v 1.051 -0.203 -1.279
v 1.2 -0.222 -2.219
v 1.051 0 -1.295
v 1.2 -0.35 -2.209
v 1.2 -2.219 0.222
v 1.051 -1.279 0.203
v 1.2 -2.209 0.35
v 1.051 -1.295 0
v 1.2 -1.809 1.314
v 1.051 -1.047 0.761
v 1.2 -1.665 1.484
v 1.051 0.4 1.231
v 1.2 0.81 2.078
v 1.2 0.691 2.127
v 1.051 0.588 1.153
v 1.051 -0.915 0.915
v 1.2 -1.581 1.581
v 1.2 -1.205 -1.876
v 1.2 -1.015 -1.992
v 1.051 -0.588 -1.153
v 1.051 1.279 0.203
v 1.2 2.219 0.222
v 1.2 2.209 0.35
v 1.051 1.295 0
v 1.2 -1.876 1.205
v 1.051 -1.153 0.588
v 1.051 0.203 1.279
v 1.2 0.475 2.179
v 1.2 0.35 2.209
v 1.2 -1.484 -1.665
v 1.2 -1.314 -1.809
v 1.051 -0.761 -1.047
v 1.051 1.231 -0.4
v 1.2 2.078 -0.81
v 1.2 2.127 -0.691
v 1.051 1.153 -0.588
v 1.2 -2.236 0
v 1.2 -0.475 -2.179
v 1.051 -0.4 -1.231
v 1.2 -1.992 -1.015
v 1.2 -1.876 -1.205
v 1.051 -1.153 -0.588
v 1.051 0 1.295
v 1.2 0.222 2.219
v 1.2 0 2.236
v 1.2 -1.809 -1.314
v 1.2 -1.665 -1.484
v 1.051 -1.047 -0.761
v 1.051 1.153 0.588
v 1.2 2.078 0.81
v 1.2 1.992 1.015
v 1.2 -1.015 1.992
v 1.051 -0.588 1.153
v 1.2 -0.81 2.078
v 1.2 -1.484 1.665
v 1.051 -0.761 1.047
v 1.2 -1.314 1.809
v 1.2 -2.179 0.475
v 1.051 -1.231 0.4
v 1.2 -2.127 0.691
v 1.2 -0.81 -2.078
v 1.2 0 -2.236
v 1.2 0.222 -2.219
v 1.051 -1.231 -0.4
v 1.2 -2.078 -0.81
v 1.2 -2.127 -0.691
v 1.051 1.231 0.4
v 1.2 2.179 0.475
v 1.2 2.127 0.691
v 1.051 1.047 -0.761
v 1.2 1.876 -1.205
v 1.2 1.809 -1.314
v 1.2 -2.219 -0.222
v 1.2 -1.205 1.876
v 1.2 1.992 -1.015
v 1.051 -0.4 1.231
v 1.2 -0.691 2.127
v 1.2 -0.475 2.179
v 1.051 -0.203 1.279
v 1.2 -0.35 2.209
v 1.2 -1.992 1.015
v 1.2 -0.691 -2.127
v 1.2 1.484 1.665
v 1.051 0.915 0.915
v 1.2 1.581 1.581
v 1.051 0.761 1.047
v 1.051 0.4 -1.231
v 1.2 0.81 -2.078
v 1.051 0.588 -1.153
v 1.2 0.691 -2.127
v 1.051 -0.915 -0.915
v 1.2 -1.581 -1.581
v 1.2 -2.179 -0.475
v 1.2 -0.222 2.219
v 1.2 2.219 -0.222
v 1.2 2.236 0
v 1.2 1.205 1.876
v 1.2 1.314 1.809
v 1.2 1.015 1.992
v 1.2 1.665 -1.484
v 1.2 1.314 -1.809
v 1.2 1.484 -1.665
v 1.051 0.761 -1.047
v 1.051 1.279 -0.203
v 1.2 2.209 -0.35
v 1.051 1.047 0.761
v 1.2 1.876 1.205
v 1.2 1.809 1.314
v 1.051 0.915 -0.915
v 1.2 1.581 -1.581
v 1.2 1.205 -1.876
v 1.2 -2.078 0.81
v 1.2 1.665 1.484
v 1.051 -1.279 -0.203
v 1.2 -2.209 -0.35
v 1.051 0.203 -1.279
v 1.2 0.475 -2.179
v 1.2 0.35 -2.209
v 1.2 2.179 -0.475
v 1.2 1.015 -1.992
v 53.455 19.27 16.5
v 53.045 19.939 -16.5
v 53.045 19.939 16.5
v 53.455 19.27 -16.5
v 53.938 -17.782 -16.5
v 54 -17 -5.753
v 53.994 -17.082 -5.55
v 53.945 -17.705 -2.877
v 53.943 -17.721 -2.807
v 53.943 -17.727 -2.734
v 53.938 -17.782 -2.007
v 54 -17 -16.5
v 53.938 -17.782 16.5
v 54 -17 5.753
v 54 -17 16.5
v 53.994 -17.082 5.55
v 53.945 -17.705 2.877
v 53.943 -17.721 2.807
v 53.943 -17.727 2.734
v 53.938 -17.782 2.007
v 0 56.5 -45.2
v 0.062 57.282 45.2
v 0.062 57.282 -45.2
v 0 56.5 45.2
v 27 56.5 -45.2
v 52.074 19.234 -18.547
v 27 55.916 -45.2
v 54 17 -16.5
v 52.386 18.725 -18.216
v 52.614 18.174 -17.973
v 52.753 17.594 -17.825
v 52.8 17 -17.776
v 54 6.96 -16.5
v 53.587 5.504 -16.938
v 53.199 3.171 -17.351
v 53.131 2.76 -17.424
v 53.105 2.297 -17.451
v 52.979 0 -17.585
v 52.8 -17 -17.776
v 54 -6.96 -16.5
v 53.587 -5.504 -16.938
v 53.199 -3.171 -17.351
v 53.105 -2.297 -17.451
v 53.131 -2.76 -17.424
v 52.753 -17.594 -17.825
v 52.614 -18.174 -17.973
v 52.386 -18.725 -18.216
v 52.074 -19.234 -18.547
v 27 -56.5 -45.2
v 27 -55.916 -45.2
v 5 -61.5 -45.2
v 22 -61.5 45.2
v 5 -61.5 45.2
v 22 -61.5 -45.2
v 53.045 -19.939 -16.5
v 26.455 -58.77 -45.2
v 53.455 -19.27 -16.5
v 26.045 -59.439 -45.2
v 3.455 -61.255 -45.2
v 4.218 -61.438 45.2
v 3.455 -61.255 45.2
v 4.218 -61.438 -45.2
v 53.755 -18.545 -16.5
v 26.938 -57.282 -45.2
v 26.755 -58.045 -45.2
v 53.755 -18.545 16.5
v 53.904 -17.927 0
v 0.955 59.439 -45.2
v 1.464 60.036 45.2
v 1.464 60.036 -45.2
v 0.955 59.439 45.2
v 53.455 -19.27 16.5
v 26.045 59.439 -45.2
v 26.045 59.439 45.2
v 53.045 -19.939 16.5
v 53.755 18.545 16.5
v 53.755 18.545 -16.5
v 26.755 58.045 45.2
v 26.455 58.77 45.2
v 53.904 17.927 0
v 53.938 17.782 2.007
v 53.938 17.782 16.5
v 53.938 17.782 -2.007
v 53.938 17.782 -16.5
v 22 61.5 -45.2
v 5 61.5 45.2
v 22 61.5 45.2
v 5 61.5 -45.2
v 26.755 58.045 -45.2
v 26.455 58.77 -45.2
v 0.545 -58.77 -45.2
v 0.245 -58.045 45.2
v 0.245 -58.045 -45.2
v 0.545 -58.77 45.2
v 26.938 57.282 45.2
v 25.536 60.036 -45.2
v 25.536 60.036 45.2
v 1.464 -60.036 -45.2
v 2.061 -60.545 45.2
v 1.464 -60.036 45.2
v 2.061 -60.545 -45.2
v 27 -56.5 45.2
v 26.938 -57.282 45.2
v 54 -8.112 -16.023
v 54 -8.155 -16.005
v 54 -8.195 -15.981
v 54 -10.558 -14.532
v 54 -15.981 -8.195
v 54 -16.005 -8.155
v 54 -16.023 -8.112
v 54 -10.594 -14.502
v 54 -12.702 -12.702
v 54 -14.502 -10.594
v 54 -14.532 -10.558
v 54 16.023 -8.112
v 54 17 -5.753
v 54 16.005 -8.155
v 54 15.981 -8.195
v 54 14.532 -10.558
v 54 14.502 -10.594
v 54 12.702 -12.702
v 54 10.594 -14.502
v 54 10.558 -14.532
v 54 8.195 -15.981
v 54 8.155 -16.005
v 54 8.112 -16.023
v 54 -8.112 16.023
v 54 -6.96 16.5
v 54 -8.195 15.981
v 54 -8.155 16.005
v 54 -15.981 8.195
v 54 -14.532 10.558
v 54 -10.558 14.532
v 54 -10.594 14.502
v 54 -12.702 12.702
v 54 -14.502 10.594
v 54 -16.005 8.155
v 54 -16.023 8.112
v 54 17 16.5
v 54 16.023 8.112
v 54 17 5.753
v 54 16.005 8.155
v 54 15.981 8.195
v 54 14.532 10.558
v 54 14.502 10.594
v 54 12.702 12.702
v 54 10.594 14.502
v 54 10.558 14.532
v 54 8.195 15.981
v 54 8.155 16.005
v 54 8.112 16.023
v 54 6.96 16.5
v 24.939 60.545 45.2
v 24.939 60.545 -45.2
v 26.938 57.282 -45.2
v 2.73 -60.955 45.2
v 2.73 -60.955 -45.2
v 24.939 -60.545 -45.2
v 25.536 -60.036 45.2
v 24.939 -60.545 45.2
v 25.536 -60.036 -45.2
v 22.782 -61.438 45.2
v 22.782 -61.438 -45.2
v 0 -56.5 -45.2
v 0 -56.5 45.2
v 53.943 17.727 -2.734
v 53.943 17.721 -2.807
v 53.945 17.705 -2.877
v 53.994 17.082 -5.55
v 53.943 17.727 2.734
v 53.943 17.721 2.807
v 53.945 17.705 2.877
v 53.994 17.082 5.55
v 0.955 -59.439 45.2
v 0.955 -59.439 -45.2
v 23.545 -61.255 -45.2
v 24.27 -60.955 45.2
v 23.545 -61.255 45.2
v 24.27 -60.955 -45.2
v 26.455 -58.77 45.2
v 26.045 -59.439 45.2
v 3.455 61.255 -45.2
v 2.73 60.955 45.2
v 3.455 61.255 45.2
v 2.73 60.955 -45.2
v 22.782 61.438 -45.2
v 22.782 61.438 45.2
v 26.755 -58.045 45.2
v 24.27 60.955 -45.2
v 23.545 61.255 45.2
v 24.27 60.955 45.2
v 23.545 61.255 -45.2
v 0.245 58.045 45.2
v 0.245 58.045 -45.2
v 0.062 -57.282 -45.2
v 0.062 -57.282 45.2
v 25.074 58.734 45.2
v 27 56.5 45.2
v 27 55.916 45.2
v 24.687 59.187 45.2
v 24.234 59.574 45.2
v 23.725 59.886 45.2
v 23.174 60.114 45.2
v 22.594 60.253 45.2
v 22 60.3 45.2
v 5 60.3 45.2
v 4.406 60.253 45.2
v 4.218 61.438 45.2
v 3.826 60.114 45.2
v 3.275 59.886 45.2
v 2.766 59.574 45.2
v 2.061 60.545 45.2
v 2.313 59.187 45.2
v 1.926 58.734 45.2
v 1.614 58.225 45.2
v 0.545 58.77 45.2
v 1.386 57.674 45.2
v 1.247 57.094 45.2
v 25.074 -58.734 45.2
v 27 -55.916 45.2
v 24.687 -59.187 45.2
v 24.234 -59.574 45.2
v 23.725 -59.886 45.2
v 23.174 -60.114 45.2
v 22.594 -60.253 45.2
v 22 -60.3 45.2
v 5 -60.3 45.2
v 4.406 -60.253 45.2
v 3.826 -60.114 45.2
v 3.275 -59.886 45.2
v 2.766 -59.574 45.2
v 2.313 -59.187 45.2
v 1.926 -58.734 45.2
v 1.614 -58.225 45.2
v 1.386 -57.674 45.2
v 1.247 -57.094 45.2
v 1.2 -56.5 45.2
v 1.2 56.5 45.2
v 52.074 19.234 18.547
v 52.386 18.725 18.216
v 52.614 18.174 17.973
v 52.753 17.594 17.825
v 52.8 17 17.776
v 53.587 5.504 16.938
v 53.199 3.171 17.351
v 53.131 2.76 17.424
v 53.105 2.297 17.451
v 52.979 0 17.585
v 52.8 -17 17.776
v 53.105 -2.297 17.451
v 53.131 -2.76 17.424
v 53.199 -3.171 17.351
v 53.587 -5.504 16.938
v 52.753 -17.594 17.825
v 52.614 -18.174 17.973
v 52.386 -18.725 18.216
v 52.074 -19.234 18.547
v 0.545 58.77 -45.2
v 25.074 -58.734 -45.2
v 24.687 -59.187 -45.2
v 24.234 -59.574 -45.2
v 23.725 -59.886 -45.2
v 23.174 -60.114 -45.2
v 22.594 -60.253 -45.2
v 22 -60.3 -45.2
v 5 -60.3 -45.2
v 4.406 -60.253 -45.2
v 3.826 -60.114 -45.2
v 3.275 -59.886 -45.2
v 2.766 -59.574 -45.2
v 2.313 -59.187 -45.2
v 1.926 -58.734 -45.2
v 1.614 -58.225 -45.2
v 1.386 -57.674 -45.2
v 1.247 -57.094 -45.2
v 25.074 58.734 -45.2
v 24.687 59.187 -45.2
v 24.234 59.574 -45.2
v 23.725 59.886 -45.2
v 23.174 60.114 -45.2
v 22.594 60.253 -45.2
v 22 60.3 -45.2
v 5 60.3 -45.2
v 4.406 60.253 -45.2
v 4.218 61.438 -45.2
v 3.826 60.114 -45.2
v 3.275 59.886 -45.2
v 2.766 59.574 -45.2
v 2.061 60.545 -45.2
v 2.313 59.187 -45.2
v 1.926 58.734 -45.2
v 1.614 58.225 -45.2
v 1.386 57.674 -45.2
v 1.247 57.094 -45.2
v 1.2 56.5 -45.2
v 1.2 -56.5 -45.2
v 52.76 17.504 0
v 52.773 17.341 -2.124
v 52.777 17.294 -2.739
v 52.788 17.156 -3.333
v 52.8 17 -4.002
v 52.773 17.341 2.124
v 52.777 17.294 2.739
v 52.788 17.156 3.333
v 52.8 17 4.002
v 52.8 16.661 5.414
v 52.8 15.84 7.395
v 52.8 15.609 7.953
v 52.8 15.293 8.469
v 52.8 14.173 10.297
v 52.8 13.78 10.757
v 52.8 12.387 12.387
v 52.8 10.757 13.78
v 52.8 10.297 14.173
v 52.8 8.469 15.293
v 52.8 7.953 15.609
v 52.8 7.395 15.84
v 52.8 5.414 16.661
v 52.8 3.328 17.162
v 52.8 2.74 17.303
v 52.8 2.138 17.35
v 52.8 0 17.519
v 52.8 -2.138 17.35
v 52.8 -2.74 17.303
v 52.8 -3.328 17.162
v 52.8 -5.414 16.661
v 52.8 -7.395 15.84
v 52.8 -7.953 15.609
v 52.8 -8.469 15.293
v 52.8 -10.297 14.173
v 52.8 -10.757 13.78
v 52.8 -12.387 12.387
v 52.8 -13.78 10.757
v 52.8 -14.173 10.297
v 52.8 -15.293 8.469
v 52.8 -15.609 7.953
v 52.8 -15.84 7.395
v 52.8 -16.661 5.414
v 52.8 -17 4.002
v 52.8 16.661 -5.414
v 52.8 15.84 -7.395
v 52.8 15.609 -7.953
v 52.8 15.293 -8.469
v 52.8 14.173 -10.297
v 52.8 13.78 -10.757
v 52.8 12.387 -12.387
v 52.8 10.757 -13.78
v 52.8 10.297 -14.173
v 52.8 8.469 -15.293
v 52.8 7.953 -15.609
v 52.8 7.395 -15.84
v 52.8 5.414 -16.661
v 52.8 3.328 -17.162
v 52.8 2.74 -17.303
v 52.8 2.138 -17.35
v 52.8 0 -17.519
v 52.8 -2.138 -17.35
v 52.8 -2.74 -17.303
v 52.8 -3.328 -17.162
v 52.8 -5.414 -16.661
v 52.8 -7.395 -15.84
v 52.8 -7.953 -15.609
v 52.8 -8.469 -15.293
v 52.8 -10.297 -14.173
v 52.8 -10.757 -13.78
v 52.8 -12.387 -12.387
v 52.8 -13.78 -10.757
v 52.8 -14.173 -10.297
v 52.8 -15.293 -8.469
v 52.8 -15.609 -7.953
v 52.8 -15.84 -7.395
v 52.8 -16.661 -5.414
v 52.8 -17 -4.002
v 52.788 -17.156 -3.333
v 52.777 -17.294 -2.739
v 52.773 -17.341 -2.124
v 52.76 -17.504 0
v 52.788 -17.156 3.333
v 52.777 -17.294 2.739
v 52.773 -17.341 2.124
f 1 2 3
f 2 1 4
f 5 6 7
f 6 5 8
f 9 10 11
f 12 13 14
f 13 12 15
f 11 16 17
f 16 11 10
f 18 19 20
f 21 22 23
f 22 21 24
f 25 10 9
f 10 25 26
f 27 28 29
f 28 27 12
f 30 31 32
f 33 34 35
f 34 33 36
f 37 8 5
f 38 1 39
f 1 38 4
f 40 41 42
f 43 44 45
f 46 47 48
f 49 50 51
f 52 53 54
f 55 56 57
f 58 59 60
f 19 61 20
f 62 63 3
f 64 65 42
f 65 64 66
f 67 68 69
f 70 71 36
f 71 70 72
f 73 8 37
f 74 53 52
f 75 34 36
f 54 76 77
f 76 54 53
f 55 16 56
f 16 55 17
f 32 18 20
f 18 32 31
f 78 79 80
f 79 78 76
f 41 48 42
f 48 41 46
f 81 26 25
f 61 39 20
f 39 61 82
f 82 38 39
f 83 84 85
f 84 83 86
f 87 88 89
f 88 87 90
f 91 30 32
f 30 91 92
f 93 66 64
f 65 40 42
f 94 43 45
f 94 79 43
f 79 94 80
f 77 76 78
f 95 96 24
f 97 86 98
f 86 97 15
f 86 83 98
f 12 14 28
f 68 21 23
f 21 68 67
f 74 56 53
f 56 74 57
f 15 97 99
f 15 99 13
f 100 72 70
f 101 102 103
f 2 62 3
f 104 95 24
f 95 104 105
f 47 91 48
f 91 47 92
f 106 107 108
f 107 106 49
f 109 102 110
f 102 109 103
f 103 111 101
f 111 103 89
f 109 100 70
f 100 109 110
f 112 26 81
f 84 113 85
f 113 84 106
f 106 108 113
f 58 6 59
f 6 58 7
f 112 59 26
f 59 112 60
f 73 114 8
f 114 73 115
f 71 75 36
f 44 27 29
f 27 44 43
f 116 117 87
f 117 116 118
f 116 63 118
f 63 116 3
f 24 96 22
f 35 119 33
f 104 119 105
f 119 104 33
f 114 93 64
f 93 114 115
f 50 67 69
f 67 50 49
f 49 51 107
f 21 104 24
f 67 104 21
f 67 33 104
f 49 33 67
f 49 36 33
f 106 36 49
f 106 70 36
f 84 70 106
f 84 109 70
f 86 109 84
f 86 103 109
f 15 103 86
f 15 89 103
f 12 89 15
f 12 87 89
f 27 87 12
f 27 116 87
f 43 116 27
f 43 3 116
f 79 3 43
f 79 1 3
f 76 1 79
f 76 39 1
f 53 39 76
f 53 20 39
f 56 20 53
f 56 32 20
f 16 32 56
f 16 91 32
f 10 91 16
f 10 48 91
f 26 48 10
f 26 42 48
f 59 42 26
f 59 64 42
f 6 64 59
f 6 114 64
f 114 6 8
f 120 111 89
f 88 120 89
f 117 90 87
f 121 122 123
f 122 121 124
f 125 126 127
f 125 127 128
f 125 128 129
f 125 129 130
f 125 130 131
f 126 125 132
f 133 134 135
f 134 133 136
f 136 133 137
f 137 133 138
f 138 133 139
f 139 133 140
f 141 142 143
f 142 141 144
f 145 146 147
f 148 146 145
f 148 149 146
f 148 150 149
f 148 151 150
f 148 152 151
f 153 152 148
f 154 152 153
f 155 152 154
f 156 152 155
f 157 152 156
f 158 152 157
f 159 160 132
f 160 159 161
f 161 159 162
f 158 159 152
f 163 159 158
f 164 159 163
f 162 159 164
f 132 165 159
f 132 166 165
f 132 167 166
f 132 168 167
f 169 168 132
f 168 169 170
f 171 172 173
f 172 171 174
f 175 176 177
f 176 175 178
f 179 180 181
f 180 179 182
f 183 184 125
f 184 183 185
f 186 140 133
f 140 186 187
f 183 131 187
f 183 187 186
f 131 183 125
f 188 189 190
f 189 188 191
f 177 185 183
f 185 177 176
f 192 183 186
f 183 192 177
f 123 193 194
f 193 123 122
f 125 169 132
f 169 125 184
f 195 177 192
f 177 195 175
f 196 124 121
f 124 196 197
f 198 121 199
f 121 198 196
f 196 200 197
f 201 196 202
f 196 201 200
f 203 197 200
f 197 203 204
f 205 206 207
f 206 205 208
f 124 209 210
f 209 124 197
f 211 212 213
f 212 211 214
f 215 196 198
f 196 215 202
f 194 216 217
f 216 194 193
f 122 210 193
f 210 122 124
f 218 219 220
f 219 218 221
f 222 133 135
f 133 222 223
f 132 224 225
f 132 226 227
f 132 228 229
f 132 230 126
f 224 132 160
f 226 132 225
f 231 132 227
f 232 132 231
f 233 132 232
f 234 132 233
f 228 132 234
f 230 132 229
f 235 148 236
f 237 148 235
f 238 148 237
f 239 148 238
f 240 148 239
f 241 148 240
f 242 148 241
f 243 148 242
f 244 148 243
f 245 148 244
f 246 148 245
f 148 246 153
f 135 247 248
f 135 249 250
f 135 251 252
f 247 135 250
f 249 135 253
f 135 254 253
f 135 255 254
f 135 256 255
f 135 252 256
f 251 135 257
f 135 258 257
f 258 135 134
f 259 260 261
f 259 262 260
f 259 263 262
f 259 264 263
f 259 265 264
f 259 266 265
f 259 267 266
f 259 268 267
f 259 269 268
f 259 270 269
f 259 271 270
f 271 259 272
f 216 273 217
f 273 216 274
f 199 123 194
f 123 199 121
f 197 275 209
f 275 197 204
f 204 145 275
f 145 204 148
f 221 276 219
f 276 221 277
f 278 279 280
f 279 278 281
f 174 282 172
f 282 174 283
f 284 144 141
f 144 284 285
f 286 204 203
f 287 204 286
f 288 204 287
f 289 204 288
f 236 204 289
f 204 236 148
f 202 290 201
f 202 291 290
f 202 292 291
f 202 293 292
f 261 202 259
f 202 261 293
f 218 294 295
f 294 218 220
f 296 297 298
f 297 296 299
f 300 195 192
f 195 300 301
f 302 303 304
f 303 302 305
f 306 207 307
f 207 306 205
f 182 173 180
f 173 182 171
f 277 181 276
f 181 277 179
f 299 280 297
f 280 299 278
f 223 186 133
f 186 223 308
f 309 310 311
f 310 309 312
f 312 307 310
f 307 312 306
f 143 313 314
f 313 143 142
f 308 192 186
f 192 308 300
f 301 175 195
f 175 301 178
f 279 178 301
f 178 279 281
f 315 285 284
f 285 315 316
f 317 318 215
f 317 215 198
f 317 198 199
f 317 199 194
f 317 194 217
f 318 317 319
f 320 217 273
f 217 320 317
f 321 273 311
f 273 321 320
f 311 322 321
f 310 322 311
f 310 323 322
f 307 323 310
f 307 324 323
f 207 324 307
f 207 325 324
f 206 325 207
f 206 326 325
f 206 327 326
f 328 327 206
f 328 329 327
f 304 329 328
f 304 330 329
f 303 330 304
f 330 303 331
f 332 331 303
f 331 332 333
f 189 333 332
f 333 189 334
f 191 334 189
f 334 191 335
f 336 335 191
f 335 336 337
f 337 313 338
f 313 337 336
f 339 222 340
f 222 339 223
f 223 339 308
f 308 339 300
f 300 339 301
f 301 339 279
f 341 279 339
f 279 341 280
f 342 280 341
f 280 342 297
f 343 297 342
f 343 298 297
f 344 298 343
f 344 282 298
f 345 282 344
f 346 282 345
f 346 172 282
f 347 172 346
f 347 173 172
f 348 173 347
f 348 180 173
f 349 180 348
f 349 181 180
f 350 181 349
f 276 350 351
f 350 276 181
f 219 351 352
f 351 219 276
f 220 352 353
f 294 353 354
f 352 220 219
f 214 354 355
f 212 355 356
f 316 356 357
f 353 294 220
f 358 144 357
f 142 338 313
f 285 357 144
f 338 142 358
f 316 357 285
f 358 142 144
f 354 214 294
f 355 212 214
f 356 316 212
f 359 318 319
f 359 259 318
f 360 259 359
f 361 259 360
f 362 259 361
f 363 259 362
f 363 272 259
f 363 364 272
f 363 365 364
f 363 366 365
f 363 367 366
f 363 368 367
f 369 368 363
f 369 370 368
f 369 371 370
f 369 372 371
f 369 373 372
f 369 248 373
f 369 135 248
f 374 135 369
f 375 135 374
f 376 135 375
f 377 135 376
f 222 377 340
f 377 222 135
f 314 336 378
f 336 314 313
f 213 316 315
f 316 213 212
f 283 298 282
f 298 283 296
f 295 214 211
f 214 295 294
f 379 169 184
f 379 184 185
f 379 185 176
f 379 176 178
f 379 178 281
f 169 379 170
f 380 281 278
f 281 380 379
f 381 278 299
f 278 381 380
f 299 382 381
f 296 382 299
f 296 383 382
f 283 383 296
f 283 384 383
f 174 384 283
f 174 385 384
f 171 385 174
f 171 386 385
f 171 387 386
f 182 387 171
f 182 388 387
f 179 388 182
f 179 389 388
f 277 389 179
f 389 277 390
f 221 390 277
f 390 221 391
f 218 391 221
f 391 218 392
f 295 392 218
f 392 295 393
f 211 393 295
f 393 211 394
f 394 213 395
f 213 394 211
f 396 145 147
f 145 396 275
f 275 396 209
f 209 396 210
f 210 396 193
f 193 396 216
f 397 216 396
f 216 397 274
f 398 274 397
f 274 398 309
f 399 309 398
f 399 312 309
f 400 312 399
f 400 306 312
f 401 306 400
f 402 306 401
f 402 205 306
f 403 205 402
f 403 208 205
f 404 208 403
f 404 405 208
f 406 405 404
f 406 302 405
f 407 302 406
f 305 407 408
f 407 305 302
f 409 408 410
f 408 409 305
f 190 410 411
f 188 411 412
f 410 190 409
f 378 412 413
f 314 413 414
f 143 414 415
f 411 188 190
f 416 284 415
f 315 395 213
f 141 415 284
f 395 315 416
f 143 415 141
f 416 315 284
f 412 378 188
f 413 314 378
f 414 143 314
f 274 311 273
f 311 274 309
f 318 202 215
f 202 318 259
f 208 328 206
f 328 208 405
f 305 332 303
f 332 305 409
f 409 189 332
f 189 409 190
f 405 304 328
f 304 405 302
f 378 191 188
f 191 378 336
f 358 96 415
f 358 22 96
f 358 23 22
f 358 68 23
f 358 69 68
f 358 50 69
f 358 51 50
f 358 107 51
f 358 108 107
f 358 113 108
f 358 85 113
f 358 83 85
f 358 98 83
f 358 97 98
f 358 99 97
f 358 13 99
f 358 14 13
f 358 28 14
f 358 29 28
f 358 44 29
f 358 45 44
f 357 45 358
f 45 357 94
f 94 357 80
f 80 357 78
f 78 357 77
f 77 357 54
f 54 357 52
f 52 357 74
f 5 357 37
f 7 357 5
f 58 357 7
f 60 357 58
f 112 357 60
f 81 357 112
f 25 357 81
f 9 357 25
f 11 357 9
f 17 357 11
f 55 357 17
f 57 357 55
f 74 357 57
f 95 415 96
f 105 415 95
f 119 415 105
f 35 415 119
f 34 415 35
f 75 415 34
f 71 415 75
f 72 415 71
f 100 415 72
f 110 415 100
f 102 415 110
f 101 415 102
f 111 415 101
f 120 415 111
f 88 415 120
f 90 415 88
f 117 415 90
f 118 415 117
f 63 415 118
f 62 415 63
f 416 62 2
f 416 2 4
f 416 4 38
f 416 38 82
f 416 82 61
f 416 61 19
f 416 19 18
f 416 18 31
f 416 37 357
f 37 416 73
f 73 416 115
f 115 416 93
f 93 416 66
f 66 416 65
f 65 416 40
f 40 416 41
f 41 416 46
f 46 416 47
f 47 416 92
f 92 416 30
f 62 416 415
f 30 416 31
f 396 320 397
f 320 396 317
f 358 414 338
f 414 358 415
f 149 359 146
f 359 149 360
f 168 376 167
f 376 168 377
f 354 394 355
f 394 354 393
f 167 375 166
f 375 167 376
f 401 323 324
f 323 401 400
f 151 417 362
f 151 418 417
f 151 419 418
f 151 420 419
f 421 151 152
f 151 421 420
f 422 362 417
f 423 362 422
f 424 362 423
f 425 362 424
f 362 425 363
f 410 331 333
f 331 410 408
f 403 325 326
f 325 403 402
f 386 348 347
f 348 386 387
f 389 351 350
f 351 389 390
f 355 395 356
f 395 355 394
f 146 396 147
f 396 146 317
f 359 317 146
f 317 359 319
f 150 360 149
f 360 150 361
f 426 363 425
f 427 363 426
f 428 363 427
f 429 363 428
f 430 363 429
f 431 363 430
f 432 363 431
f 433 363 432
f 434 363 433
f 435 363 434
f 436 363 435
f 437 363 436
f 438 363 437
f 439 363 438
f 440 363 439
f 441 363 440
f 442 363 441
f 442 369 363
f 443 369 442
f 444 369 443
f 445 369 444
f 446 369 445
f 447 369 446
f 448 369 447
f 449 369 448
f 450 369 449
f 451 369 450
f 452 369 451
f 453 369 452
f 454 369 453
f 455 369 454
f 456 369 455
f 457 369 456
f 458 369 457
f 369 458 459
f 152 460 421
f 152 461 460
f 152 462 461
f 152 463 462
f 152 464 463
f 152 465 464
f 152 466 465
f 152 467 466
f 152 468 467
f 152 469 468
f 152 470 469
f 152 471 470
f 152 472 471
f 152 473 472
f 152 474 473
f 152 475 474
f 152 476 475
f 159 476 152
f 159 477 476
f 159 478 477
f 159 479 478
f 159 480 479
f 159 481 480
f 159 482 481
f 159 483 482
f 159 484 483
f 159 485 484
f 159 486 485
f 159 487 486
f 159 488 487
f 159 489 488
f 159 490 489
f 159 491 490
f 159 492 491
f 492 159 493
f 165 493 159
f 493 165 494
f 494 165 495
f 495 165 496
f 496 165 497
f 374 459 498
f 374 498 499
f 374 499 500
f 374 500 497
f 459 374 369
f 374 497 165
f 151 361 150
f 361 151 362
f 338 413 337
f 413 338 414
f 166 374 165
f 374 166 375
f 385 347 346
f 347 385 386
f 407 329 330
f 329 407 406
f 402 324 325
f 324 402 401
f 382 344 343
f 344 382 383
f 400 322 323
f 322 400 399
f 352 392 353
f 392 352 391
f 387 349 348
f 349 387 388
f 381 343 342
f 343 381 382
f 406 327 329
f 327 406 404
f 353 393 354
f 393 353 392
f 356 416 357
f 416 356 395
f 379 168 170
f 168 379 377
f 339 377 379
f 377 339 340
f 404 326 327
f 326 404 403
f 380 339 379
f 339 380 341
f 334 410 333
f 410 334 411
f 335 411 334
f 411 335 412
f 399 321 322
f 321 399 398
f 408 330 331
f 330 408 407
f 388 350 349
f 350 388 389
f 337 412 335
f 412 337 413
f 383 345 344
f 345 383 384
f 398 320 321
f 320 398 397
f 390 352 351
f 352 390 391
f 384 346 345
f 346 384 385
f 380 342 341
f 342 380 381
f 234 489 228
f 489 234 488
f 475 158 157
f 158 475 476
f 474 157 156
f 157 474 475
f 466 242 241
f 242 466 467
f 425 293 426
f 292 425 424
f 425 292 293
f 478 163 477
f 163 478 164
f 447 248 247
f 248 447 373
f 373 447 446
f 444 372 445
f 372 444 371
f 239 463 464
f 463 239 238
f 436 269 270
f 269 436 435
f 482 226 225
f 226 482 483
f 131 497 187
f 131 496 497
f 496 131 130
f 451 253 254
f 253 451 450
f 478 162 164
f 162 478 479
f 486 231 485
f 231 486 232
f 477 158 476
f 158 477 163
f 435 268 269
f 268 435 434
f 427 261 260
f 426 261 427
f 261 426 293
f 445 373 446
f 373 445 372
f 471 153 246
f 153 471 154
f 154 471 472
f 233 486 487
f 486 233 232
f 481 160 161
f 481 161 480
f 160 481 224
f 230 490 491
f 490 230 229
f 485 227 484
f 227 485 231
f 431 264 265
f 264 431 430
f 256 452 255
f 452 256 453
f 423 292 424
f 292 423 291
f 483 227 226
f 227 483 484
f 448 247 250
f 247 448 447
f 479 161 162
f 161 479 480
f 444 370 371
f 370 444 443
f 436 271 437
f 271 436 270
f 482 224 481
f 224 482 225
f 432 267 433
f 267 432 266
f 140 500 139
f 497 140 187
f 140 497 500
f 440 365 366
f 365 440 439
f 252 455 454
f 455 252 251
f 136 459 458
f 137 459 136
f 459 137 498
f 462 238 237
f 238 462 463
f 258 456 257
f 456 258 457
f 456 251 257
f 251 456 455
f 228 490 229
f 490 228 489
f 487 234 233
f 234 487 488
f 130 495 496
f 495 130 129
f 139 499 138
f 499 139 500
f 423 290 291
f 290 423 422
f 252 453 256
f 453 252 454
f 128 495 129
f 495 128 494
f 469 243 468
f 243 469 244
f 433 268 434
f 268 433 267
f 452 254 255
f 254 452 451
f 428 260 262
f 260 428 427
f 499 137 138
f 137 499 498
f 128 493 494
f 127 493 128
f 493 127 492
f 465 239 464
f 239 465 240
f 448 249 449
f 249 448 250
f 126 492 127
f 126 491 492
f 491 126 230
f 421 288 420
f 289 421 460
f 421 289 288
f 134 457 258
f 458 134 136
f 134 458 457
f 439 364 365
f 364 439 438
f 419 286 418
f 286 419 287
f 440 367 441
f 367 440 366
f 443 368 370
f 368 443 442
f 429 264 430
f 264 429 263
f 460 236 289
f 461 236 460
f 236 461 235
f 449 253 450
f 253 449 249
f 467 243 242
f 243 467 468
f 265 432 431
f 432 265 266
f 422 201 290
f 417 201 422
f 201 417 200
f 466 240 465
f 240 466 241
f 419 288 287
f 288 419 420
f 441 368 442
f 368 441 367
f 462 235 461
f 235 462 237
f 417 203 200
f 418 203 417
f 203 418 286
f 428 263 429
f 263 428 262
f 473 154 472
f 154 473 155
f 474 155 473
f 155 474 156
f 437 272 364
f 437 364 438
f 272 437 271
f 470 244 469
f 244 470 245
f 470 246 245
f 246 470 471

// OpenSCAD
$fn = 40;

nozzle_dia=0.6;

testtube_diameter=32;
testtube_height=180;
testtube_tolerance=1;

module testTubeBulk(diameter=32, height=30+50*3)
{
    translate([0,0,diameter/2])
    {
        cylinder(r=diameter/2, h=height);
        sphere(r=diameter/2);
    }
}

// Cube Approach
rotate([0,90,0])
difference()
{
    holderHeight=testtube_height*0.30;
    holderThickness=nozzle_dia*2;
    holderTopThickness=2;
    holderBaseThickness=holderHeight*1.5;

    union()
    {
        hull()
        {
            rounding = 5;
            // top
            topwidth=testtube_diameter+holderTopThickness;
            topwidthSide=testtube_diameter+1;
            translate([0,-topwidth/2,-rounding+holderHeight])
                rotate([0,90,0])
                cylinder(r=rounding, h=topwidthSide, center=true);
            translate([0,topwidth/2,-rounding+holderHeight])
                rotate([0,90,0])
                cylinder(r=rounding, h=topwidthSide, center=true);
            // bottom
            bottomwidth=testtube_diameter+holderBaseThickness;
            bottomwidthSide=bottomwidth*0.8;
            translate([0,-bottomwidth/2,rounding])
                rotate([0,90,0])
                cylinder(r=rounding, h=bottomwidthSide, center=true);
            translate([0,bottomwidth/2,rounding])
                rotate([0,90,0])
                cylinder(r=rounding, h=bottomwidthSide, center=true);
            // Mid
            Midwidth=testtube_diameter+holderBaseThickness;
            MidwidthSide=bottomwidth*0.8;
            translate([0,-bottomwidth/2,-rounding+holderHeight/2])
                rotate([0,90,0])
                cylinder(r=rounding, h=MidwidthSide, center=true);
            translate([0,bottomwidth/2,-rounding+holderHeight/2])
                rotate([0,90,0])
                cylinder(r=rounding, h=MidwidthSide, center=true);
        }
    }

    hull()
    {
        rounding = 5;
        // top
        topwidth=testtube_diameter+holderTopThickness;
        translate([0,-topwidth/2,-rounding+holderHeight])
            rotate([0,90,0])
            cylinder(r=rounding-holderThickness, h=bottomwidth+10, center=true);
        translate([0,topwidth/2,-rounding+holderHeight])
            rotate([0,90,0])
            cylinder(r=rounding-holderThickness, h=bottomwidth+10, center=true);
        // bottom
        bottomwidth=testtube_diameter+holderBaseThickness;
        bottomHolderthickness=holderThickness;
        translate([0,-bottomwidth/2,rounding])
            rotate([0,90,0])
            cylinder(r=rounding-bottomHolderthickness, h=bottomwidth+10, center=true);
        translate([0,bottomwidth/2,rounding])
            rotate([0,90,0])
            cylinder(r=rounding-bottomHolderthickness, h=bottomwidth+10, center=true);
        // Mid
        midHolderthickness=holderThickness;
        translate([0,-bottomwidth/2,-rounding+holderHeight/2])
            rotate([0,90,0])
            cylinder(r=rounding-midHolderthickness, h=bottomwidth+10, center=true);
        translate([0,bottomwidth/2,-rounding+holderHeight/2])
            rotate([0,90,0])
            cylinder(r=rounding-midHolderthickness, h=bottomwidth+10, center=true);
    }

    translate([0,0,holderHeight*0.9+0.1])
        cylinder(r1=testtube_diameter/2, r2=testtube_diameter/2+holderTopThickness, h=holderHeight*0.1);

    translate([0,0,1])
        testTubeBulk(testtube_diameter+testtube_tolerance, testtube_height);

    // Simulated Tube
    %difference()
    {
        translate([0,0,1])
            testTubeBulk(testtube_diameter, testtube_height);
        translate([0,0,1+1])
            testTubeBulk(testtube_diameter-1, testtube_height);
    }
}
